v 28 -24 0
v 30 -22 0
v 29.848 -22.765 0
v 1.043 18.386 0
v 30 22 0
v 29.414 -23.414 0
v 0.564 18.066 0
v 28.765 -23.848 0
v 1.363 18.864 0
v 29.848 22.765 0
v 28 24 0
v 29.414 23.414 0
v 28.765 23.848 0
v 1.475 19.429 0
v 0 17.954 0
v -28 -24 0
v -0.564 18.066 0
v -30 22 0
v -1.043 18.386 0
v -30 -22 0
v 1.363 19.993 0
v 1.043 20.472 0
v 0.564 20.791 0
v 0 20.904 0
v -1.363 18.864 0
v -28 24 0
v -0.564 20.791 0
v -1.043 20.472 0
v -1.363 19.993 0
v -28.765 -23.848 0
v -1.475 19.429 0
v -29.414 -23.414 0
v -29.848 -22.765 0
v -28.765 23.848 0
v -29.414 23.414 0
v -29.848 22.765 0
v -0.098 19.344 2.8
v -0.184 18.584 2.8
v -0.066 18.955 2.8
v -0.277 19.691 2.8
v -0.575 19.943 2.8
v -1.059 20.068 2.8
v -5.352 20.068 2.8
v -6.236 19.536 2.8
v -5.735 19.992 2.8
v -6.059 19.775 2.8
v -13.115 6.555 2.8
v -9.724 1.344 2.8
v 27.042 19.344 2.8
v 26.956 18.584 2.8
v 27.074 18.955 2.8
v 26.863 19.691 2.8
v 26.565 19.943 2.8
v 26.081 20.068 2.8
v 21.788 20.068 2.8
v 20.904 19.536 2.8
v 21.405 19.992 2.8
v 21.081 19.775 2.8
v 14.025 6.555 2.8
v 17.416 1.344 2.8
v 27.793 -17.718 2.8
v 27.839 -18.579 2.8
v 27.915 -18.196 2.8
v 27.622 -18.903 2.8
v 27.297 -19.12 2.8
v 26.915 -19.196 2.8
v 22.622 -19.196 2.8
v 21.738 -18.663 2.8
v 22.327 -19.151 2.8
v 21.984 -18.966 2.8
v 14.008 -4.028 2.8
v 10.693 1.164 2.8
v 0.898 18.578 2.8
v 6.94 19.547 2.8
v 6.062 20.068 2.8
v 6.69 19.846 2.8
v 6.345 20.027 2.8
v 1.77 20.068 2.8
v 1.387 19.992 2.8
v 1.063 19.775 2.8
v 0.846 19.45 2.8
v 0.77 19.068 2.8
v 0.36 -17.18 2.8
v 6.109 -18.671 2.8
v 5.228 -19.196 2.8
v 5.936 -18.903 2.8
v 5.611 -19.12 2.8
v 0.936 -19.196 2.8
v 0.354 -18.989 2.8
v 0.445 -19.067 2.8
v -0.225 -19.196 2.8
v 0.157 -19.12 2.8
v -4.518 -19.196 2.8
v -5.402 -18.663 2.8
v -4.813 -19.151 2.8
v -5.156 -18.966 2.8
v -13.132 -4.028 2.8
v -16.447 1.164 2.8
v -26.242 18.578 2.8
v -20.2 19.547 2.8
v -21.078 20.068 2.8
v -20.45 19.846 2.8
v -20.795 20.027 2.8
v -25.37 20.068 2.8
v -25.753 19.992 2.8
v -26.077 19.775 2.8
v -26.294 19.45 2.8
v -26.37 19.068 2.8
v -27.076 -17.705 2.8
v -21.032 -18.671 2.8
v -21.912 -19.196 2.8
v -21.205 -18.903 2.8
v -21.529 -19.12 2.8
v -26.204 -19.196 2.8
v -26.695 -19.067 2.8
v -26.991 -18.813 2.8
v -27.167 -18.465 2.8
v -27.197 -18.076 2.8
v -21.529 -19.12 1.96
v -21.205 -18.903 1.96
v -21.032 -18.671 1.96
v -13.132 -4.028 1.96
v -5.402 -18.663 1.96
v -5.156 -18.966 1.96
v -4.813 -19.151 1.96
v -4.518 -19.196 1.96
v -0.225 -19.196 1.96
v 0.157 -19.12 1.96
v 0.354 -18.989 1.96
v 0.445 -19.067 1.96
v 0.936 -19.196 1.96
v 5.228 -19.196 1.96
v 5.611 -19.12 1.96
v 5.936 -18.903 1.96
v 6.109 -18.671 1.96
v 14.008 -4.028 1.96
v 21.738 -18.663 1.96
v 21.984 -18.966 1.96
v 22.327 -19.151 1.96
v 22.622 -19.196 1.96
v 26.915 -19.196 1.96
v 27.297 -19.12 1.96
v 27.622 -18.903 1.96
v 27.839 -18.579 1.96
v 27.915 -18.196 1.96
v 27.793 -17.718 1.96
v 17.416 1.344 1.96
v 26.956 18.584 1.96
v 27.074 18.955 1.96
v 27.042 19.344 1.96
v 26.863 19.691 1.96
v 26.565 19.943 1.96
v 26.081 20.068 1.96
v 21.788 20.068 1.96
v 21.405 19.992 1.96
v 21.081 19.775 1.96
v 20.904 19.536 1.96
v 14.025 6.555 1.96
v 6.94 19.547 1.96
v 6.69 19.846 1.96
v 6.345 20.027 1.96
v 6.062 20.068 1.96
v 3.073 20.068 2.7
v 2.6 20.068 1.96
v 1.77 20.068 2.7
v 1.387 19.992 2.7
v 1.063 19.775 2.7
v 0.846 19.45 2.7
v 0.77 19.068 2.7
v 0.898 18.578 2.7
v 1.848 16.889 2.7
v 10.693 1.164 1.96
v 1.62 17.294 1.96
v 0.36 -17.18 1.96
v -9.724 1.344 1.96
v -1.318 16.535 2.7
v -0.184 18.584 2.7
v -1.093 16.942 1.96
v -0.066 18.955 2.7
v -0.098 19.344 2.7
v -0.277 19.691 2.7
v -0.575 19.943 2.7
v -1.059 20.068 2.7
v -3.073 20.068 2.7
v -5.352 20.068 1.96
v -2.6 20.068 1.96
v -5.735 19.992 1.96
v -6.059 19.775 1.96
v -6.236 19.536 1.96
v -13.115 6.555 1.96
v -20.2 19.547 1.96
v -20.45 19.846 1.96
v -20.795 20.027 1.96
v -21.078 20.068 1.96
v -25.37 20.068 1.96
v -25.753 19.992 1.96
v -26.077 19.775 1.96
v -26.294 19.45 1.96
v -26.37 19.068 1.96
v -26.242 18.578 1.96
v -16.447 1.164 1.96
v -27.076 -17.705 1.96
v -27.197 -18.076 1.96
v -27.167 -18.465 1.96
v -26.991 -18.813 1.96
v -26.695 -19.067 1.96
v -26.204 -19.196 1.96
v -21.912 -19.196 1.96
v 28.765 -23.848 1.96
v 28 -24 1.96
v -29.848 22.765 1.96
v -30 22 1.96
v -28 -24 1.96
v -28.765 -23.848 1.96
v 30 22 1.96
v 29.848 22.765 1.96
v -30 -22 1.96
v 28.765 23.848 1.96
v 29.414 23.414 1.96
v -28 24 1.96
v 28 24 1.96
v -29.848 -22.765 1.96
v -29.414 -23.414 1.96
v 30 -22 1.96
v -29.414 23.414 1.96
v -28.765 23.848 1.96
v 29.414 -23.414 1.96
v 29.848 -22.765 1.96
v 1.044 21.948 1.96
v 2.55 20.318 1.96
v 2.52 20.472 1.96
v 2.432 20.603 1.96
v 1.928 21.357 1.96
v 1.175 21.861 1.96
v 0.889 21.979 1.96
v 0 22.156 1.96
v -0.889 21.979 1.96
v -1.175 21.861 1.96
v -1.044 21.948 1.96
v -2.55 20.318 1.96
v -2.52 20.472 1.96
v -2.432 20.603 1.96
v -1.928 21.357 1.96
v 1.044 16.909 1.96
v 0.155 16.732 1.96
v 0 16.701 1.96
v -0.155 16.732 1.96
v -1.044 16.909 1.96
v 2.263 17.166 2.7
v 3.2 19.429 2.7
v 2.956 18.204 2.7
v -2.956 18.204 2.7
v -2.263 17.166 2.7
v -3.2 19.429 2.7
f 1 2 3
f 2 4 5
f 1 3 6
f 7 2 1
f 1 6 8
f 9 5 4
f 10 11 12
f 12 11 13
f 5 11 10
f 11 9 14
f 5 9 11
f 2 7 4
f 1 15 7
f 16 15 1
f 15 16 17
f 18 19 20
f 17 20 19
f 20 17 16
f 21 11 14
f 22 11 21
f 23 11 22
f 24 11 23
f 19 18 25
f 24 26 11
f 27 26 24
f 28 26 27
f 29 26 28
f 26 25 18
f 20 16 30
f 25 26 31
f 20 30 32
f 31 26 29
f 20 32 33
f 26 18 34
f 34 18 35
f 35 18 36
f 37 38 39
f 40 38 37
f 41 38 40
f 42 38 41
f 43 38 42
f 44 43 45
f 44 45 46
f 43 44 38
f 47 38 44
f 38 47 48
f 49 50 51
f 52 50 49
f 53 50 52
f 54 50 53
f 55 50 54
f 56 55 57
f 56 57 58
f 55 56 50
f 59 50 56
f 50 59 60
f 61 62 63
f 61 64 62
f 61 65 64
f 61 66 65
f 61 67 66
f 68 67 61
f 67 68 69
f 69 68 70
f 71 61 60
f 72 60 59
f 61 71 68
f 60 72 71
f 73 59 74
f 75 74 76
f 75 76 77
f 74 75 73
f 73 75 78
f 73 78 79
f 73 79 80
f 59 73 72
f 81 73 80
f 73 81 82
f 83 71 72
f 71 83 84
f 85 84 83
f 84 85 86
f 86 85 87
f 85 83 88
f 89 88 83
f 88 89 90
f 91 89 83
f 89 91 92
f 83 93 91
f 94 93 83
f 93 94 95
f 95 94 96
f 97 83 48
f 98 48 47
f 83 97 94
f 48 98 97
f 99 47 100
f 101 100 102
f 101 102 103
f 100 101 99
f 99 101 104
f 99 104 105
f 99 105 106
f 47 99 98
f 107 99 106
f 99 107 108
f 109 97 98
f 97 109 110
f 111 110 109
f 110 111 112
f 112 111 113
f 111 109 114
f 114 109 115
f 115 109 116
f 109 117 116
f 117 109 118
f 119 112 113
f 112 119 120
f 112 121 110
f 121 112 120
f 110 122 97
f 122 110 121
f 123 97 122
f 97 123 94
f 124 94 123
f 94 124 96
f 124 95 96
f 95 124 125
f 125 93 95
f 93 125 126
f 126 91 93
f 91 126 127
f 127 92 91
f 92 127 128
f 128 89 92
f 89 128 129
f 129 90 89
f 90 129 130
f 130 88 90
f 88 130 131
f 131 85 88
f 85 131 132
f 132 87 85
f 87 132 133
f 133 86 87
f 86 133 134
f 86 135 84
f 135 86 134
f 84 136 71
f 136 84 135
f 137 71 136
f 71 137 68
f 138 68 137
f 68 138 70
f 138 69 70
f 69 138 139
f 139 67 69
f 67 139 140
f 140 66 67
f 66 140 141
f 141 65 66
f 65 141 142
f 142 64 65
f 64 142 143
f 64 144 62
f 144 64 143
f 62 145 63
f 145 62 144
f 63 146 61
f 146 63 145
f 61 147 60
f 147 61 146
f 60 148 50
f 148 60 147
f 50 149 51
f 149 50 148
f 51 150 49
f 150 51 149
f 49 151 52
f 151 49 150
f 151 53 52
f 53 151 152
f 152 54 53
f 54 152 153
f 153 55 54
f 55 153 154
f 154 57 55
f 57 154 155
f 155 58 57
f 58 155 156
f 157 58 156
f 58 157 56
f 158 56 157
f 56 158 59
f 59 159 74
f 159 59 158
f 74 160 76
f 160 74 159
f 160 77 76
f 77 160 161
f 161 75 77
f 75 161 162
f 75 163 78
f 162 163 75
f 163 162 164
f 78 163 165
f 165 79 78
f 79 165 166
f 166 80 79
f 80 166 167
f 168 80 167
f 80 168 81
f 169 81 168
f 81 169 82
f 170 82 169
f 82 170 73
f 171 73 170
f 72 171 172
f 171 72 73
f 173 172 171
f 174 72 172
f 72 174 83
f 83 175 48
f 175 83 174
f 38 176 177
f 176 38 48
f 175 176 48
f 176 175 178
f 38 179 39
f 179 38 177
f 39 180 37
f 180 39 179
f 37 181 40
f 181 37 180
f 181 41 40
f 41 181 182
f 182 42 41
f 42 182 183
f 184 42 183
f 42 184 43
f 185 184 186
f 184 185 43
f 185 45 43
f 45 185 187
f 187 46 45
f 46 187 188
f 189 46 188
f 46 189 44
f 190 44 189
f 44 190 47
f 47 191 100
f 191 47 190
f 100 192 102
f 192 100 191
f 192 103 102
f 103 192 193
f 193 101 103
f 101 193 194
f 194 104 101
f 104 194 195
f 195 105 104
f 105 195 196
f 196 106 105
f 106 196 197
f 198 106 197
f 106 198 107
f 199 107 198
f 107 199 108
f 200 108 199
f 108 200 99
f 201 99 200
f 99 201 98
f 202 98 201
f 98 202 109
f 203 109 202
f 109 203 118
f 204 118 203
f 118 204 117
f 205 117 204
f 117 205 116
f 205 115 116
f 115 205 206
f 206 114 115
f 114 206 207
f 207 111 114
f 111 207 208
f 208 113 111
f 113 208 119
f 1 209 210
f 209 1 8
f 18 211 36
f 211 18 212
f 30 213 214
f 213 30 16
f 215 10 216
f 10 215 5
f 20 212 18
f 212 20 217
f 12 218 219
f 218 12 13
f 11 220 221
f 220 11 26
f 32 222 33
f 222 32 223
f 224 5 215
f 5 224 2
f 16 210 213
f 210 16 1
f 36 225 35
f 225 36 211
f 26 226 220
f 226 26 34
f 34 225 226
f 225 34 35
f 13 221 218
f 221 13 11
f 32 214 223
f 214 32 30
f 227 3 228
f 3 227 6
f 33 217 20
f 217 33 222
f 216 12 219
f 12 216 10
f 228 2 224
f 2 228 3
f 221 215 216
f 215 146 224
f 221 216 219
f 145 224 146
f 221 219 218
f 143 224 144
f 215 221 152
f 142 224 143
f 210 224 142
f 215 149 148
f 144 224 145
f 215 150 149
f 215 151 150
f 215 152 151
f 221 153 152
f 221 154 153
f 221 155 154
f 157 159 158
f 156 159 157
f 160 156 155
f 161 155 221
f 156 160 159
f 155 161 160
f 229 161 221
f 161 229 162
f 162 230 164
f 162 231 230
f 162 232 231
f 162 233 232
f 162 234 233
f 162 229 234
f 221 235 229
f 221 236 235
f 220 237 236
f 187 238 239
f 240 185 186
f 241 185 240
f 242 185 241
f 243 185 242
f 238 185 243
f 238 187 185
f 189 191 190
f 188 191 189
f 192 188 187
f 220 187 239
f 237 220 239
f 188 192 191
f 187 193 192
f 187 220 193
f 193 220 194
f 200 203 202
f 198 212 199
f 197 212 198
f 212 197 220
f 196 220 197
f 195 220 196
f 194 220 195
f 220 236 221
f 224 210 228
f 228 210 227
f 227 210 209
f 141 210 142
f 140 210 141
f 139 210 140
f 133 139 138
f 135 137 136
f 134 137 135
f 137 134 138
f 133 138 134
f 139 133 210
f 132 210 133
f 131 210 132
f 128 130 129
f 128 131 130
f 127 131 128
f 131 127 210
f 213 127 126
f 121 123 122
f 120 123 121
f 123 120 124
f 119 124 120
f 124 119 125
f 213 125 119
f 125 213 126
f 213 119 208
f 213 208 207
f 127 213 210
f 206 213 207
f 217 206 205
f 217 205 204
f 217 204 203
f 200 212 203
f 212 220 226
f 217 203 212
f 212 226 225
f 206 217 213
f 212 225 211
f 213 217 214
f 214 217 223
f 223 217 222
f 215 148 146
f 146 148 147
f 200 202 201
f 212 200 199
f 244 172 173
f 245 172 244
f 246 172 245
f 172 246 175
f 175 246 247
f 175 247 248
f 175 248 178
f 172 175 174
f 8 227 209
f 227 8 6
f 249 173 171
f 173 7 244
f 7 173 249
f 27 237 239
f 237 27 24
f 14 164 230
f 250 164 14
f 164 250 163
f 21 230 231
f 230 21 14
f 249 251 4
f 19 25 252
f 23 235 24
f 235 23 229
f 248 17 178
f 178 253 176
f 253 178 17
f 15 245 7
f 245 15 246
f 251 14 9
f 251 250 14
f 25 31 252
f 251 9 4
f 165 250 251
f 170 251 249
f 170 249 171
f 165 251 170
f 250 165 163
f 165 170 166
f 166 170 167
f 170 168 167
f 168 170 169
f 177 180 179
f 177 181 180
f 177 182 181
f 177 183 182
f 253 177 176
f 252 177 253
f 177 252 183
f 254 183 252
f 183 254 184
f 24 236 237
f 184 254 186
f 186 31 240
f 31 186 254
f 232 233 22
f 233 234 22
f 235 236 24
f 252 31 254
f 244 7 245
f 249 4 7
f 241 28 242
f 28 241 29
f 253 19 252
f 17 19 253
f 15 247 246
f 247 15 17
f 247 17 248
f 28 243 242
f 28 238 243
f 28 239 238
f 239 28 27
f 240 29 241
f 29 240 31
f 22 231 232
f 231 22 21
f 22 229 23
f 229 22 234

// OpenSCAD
// Apartment Number Tile

$fn = 16;

character = "XX";
boldness = 1.0;
tile_wid = 30.0;
tile_len = 48.0;
font_size = 30;

screw_head_dia = 6.4;
screw_shaft_dia = 2.95;
screw_head_h = 2.7;
screw_hole_inset = 2.0;

tile_h = 1.96;
letter_h = 0.84; // On top of tile_h
tile_rounding = 2.0;

module screwHole() {
    cylinder(d1=screw_shaft_dia, d2=screw_head_dia, h=screw_head_h);
    
}

module numberTile() {
    color("#f3f3f3")
    linear_extrude(tile_h+letter_h)
    offset(boldness)
    scale([1,1.3])
    text(character, "Arial", halign="center", valign="center", size=font_size);
    color("#333333")
    linear_extrude(tile_h)
    offset(tile_rounding) offset(-tile_rounding)
    square([tile_wid*len(character), tile_len], center=true);
}

difference() {
    numberTile();
    translate([0, (tile_wid)/1.4-screw_hole_inset])
    #screwHole();
}
